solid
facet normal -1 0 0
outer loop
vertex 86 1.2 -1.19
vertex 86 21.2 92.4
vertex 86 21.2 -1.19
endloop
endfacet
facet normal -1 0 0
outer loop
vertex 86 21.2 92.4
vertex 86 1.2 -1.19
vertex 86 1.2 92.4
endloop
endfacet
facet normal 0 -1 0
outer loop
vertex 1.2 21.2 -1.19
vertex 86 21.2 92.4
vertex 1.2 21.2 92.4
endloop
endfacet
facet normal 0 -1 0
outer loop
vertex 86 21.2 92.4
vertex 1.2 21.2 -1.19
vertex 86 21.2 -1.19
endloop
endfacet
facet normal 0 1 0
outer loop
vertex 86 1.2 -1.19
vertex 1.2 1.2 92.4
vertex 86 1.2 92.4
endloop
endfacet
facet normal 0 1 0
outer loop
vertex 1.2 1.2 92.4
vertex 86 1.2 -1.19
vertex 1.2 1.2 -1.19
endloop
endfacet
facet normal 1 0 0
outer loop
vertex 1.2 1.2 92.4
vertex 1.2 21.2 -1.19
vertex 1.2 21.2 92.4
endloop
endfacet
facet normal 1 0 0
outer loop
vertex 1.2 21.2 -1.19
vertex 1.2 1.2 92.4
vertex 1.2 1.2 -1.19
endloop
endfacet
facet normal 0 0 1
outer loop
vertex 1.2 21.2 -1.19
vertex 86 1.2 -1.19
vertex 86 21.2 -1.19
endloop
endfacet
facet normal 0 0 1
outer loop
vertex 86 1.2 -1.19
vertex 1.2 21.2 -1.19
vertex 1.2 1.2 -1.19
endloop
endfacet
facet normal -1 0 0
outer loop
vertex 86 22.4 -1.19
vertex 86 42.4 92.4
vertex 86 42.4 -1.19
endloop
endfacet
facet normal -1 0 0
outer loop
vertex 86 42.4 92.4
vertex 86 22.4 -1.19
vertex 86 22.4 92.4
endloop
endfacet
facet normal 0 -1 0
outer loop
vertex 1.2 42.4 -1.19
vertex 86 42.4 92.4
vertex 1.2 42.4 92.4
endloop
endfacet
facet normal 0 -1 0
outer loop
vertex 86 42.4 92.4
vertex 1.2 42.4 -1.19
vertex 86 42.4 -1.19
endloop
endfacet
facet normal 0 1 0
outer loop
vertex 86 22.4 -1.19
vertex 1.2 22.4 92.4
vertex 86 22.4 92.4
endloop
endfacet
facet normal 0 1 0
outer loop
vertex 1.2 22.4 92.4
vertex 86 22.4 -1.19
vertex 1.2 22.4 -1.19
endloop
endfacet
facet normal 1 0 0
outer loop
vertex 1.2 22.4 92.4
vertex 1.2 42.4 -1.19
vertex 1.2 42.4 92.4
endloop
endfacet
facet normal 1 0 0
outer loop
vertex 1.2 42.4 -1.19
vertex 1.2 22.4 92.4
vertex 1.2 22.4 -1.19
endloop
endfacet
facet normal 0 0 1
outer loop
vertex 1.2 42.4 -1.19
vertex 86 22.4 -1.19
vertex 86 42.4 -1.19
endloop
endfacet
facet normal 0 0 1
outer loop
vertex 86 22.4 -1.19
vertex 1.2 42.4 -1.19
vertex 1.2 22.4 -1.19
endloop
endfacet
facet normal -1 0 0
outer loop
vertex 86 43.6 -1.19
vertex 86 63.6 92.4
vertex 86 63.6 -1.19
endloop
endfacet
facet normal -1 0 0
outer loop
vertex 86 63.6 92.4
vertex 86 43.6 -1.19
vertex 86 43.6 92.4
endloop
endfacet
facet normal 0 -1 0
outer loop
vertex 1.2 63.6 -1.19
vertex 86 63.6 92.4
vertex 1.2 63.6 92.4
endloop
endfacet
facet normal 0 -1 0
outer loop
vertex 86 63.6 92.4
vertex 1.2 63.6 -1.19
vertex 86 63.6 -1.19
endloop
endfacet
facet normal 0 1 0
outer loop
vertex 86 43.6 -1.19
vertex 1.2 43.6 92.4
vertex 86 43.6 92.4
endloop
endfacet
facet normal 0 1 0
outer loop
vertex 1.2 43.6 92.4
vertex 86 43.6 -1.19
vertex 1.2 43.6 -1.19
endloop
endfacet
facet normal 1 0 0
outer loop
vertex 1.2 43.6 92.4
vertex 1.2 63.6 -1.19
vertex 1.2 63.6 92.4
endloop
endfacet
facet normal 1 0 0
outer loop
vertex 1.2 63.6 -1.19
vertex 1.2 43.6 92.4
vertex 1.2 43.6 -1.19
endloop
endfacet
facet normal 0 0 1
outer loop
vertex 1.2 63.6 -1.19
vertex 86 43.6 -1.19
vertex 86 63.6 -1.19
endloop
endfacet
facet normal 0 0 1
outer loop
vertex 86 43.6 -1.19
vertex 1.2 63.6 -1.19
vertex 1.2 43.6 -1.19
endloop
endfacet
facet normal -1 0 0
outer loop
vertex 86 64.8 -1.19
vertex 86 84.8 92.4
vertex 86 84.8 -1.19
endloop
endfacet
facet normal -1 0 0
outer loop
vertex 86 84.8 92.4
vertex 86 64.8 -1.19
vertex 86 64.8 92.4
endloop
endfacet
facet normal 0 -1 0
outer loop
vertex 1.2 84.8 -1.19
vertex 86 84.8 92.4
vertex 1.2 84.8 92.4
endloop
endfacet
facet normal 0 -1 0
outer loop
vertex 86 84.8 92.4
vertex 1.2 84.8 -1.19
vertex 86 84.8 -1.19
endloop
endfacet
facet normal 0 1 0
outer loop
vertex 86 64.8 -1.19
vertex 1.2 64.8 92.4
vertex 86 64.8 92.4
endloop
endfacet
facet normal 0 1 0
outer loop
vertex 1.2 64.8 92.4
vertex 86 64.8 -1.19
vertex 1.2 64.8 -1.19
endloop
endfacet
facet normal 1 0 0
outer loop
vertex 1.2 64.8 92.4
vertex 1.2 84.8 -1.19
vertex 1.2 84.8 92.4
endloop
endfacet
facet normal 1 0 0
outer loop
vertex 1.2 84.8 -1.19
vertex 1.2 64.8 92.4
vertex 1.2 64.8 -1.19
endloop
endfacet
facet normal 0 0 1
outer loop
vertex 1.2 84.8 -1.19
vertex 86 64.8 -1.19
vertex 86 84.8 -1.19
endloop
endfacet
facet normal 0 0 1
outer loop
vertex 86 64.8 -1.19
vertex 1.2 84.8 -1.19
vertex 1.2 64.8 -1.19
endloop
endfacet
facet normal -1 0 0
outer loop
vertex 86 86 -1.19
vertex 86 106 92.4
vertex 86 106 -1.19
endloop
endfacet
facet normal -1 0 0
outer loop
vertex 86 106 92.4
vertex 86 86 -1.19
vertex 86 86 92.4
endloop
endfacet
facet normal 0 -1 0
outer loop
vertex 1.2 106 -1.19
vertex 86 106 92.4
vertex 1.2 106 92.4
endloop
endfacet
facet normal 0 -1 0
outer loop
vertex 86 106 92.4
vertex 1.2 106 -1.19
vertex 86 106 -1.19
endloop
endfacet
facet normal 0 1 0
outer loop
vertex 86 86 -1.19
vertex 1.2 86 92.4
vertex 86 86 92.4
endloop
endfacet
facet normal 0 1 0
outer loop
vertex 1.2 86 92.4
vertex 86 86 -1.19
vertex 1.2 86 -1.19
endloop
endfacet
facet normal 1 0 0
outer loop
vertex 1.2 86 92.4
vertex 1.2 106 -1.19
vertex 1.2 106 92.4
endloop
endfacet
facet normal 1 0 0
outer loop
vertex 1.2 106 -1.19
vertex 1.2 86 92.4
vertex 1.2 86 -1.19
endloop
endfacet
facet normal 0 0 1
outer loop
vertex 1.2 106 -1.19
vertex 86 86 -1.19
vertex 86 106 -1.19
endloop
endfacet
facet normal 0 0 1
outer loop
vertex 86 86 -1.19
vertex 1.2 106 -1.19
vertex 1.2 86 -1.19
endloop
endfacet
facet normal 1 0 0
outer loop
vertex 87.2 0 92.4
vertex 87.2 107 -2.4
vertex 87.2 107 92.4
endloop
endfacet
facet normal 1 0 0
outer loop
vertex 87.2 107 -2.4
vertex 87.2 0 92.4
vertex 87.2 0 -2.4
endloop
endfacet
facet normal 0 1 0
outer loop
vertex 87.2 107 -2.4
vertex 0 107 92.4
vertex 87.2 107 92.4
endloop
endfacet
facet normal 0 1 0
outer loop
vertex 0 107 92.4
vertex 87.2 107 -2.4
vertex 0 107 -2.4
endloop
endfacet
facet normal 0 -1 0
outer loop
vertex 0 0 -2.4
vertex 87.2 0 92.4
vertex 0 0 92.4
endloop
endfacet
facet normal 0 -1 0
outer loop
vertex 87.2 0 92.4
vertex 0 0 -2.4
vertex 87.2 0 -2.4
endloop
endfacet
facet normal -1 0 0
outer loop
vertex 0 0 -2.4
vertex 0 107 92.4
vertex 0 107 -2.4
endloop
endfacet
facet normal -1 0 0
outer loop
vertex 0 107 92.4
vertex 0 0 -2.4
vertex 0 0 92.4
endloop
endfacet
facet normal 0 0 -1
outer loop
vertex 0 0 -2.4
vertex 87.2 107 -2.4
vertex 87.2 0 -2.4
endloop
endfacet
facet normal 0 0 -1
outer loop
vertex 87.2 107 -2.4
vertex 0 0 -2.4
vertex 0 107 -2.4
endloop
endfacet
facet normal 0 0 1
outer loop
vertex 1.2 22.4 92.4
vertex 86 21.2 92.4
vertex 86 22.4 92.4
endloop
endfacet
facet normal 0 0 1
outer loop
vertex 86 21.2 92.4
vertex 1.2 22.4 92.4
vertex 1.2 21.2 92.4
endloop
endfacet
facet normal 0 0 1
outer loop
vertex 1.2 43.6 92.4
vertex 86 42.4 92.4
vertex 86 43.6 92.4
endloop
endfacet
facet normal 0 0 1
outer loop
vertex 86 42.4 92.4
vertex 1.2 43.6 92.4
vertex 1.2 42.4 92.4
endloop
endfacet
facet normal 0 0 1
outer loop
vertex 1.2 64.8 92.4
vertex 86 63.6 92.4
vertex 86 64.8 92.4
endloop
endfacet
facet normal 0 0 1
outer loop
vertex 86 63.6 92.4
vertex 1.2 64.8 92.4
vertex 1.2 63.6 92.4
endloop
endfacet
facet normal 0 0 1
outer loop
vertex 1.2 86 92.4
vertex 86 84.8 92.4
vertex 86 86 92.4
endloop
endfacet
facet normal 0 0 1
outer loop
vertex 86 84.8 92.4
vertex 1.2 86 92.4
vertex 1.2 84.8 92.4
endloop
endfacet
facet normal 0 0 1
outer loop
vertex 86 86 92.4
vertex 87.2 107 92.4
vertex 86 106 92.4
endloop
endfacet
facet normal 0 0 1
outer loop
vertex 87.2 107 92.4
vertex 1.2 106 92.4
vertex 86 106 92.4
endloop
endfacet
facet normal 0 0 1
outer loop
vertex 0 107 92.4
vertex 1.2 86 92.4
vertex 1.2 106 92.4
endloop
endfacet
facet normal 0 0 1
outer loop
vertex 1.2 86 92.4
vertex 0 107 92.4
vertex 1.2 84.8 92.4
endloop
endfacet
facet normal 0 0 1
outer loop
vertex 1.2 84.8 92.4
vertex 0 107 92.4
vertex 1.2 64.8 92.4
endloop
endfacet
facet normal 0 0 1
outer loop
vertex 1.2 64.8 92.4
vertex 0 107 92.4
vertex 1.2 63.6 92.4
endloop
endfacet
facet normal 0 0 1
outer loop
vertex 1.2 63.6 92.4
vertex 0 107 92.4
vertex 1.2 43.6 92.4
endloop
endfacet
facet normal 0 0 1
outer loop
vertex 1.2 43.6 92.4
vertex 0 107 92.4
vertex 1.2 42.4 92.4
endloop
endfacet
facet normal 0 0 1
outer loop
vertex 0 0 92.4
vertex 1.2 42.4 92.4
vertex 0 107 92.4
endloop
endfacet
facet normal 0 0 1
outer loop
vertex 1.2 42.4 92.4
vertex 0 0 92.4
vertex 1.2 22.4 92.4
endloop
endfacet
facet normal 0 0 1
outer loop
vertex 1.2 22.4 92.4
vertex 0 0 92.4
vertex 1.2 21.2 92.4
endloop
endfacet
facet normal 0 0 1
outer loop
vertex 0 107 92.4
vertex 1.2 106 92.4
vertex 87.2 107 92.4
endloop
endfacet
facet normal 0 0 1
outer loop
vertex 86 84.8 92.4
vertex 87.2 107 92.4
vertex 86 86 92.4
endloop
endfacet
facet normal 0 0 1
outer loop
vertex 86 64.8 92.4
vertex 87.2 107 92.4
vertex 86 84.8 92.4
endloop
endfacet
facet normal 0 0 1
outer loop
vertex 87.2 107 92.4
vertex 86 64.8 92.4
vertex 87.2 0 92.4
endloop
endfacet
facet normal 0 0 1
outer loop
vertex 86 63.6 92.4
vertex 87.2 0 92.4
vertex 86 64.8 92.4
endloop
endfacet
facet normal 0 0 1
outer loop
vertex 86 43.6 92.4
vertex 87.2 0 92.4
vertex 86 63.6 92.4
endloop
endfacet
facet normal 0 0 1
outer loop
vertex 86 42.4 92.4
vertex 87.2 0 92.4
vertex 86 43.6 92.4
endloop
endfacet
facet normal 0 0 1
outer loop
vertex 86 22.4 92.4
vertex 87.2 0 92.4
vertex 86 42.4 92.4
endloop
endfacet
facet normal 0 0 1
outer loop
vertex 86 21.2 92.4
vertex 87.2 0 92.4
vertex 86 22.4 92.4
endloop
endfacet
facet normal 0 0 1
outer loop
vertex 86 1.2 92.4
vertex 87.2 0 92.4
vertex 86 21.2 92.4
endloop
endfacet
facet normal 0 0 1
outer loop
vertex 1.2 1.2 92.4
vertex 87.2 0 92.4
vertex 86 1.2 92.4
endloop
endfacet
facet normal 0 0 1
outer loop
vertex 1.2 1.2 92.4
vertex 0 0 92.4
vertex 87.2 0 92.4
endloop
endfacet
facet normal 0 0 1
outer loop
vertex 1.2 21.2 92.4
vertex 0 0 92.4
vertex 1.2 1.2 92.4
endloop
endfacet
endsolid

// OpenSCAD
part = "dresser"; // [drawer,dresser]
notch_mode = false;
walls=1.2;
tw=80;
th=90;
td=17.6;
roundness=2;
knob_halign="middle"; // [left,middle,right]
knob_valign="middle";
knob_depth=12;
knob_width=2;
notch_depth=5;
pockets_deep=1;
pockets_wide=1;
dresser_high=5;
dresser_wide=1;

if(part=="dresser")
{
  translate([0,0,th+walls*2]) rotate([-90,0,0])
  {
  //difference()
    {
    if(!notch_mode)
      difference() {
        cube([tw+walls*6,th+walls*4,walls*5+(td+walls*2)*dresser_high+1]);
        for(d=[1:dresser_high])
        {
          translate([walls,-.01,walls+((d-1)*(td+walls*3))]) cube([tw+walls*4,th+walls*3,td+walls*2]);
        }
      }
    else {
      difference(){
        cube([tw+walls*2+notch_depth*2,th+walls*2,walls*5+(td+walls*2)*dresser_high]);
        translate([notch_depth,-.01,walls*2]) cube([tw+walls*2,(th+walls)*dresser_high,(td+walls*2)*dresser_high-walls*2]);
        for(d=[1:dresser_high])
        {
          color("red")
          translate([walls,-.01,walls+((d-1)*(td+walls*3))]) cube([tw+notch_depth*2,th+walls,walls*8]);
          translate([notch_depth,-0.01,walls*8+((d-1)*(td+walls*3))]) cube([tw+walls*2,th,td-walls*5]);
        }
      }
    }
  }
  if(notch_mode) {
    for(d=[1:dresser_high])
      translate([0,th+walls,walls*2+((d-1)*(td+walls*2))]) cube([tw+walls*10,walls,walls*8]);
  }
  }
} else if(part=="drawer")
{
  if(notch_mode)
  {
    translate([walls*-3,0]) cube([tw+walls*6,th,walls]);
  }
  difference(){
    rectangle(tw,th,td,roundness);
    for(y=[1:pockets_deep])
    {
      for(x=[1:pockets_wide])
      {
        translate([
            walls+((x-1)*((tw-walls)/pockets_wide)),
            walls+((y-1)*((th-walls)/pockets_deep)),
            walls]) 
          rectangle(
            tw/pockets_wide-walls*(pockets_wide==1?2:1.5),
            th/pockets_deep-walls*(pockets_deep==1?2:1.5)+.2,
            td,
            roundness-walls);
      }
    }
    /*translate([walls,th/2+walls*.5,walls]) rectangle(tw/2-walls*1.5,th/2-walls*1.5,td,roundness-1);
    translate([tw/2+walls*.5,walls,walls]) rectangle(tw/2-walls*1.5,th/2-walls*1.5,td,roundness-1);
    translate([tw/2+walls/2,th/2+walls/2,walls]) rectangle(tw/2-walls*1.5,th/2-walls*1.5,td,roundness-1);*/
  }
  translate([(tw/4)*(knob_halign=="left"?-1:(knob_halign=="right"?1:0)),0,0])
  {
    translate([tw/2-knob_width/2,-1*knob_depth])
    difference(){
      cube([knob_width,knob_depth,td+walls*1.3]);
      color("red") translate([0,-3,-.7*knob_depth])
        rotate([45,0,0]) cube([knob_width,knob_depth,knob_depth]);
      color("red") translate([0,-3.0,td-knob_depth*.65]) rotate([45,0,0]) cube([knob_width,knob_depth,knob_depth]);
    }
  }
}

module rectangle(w,h,d,r=0)
{
  translate([r,r])
   minkowski(){
     cube([w-r*2,h-r*2,d]);
     cylinder(r=r,$fn=30);
   }
}
